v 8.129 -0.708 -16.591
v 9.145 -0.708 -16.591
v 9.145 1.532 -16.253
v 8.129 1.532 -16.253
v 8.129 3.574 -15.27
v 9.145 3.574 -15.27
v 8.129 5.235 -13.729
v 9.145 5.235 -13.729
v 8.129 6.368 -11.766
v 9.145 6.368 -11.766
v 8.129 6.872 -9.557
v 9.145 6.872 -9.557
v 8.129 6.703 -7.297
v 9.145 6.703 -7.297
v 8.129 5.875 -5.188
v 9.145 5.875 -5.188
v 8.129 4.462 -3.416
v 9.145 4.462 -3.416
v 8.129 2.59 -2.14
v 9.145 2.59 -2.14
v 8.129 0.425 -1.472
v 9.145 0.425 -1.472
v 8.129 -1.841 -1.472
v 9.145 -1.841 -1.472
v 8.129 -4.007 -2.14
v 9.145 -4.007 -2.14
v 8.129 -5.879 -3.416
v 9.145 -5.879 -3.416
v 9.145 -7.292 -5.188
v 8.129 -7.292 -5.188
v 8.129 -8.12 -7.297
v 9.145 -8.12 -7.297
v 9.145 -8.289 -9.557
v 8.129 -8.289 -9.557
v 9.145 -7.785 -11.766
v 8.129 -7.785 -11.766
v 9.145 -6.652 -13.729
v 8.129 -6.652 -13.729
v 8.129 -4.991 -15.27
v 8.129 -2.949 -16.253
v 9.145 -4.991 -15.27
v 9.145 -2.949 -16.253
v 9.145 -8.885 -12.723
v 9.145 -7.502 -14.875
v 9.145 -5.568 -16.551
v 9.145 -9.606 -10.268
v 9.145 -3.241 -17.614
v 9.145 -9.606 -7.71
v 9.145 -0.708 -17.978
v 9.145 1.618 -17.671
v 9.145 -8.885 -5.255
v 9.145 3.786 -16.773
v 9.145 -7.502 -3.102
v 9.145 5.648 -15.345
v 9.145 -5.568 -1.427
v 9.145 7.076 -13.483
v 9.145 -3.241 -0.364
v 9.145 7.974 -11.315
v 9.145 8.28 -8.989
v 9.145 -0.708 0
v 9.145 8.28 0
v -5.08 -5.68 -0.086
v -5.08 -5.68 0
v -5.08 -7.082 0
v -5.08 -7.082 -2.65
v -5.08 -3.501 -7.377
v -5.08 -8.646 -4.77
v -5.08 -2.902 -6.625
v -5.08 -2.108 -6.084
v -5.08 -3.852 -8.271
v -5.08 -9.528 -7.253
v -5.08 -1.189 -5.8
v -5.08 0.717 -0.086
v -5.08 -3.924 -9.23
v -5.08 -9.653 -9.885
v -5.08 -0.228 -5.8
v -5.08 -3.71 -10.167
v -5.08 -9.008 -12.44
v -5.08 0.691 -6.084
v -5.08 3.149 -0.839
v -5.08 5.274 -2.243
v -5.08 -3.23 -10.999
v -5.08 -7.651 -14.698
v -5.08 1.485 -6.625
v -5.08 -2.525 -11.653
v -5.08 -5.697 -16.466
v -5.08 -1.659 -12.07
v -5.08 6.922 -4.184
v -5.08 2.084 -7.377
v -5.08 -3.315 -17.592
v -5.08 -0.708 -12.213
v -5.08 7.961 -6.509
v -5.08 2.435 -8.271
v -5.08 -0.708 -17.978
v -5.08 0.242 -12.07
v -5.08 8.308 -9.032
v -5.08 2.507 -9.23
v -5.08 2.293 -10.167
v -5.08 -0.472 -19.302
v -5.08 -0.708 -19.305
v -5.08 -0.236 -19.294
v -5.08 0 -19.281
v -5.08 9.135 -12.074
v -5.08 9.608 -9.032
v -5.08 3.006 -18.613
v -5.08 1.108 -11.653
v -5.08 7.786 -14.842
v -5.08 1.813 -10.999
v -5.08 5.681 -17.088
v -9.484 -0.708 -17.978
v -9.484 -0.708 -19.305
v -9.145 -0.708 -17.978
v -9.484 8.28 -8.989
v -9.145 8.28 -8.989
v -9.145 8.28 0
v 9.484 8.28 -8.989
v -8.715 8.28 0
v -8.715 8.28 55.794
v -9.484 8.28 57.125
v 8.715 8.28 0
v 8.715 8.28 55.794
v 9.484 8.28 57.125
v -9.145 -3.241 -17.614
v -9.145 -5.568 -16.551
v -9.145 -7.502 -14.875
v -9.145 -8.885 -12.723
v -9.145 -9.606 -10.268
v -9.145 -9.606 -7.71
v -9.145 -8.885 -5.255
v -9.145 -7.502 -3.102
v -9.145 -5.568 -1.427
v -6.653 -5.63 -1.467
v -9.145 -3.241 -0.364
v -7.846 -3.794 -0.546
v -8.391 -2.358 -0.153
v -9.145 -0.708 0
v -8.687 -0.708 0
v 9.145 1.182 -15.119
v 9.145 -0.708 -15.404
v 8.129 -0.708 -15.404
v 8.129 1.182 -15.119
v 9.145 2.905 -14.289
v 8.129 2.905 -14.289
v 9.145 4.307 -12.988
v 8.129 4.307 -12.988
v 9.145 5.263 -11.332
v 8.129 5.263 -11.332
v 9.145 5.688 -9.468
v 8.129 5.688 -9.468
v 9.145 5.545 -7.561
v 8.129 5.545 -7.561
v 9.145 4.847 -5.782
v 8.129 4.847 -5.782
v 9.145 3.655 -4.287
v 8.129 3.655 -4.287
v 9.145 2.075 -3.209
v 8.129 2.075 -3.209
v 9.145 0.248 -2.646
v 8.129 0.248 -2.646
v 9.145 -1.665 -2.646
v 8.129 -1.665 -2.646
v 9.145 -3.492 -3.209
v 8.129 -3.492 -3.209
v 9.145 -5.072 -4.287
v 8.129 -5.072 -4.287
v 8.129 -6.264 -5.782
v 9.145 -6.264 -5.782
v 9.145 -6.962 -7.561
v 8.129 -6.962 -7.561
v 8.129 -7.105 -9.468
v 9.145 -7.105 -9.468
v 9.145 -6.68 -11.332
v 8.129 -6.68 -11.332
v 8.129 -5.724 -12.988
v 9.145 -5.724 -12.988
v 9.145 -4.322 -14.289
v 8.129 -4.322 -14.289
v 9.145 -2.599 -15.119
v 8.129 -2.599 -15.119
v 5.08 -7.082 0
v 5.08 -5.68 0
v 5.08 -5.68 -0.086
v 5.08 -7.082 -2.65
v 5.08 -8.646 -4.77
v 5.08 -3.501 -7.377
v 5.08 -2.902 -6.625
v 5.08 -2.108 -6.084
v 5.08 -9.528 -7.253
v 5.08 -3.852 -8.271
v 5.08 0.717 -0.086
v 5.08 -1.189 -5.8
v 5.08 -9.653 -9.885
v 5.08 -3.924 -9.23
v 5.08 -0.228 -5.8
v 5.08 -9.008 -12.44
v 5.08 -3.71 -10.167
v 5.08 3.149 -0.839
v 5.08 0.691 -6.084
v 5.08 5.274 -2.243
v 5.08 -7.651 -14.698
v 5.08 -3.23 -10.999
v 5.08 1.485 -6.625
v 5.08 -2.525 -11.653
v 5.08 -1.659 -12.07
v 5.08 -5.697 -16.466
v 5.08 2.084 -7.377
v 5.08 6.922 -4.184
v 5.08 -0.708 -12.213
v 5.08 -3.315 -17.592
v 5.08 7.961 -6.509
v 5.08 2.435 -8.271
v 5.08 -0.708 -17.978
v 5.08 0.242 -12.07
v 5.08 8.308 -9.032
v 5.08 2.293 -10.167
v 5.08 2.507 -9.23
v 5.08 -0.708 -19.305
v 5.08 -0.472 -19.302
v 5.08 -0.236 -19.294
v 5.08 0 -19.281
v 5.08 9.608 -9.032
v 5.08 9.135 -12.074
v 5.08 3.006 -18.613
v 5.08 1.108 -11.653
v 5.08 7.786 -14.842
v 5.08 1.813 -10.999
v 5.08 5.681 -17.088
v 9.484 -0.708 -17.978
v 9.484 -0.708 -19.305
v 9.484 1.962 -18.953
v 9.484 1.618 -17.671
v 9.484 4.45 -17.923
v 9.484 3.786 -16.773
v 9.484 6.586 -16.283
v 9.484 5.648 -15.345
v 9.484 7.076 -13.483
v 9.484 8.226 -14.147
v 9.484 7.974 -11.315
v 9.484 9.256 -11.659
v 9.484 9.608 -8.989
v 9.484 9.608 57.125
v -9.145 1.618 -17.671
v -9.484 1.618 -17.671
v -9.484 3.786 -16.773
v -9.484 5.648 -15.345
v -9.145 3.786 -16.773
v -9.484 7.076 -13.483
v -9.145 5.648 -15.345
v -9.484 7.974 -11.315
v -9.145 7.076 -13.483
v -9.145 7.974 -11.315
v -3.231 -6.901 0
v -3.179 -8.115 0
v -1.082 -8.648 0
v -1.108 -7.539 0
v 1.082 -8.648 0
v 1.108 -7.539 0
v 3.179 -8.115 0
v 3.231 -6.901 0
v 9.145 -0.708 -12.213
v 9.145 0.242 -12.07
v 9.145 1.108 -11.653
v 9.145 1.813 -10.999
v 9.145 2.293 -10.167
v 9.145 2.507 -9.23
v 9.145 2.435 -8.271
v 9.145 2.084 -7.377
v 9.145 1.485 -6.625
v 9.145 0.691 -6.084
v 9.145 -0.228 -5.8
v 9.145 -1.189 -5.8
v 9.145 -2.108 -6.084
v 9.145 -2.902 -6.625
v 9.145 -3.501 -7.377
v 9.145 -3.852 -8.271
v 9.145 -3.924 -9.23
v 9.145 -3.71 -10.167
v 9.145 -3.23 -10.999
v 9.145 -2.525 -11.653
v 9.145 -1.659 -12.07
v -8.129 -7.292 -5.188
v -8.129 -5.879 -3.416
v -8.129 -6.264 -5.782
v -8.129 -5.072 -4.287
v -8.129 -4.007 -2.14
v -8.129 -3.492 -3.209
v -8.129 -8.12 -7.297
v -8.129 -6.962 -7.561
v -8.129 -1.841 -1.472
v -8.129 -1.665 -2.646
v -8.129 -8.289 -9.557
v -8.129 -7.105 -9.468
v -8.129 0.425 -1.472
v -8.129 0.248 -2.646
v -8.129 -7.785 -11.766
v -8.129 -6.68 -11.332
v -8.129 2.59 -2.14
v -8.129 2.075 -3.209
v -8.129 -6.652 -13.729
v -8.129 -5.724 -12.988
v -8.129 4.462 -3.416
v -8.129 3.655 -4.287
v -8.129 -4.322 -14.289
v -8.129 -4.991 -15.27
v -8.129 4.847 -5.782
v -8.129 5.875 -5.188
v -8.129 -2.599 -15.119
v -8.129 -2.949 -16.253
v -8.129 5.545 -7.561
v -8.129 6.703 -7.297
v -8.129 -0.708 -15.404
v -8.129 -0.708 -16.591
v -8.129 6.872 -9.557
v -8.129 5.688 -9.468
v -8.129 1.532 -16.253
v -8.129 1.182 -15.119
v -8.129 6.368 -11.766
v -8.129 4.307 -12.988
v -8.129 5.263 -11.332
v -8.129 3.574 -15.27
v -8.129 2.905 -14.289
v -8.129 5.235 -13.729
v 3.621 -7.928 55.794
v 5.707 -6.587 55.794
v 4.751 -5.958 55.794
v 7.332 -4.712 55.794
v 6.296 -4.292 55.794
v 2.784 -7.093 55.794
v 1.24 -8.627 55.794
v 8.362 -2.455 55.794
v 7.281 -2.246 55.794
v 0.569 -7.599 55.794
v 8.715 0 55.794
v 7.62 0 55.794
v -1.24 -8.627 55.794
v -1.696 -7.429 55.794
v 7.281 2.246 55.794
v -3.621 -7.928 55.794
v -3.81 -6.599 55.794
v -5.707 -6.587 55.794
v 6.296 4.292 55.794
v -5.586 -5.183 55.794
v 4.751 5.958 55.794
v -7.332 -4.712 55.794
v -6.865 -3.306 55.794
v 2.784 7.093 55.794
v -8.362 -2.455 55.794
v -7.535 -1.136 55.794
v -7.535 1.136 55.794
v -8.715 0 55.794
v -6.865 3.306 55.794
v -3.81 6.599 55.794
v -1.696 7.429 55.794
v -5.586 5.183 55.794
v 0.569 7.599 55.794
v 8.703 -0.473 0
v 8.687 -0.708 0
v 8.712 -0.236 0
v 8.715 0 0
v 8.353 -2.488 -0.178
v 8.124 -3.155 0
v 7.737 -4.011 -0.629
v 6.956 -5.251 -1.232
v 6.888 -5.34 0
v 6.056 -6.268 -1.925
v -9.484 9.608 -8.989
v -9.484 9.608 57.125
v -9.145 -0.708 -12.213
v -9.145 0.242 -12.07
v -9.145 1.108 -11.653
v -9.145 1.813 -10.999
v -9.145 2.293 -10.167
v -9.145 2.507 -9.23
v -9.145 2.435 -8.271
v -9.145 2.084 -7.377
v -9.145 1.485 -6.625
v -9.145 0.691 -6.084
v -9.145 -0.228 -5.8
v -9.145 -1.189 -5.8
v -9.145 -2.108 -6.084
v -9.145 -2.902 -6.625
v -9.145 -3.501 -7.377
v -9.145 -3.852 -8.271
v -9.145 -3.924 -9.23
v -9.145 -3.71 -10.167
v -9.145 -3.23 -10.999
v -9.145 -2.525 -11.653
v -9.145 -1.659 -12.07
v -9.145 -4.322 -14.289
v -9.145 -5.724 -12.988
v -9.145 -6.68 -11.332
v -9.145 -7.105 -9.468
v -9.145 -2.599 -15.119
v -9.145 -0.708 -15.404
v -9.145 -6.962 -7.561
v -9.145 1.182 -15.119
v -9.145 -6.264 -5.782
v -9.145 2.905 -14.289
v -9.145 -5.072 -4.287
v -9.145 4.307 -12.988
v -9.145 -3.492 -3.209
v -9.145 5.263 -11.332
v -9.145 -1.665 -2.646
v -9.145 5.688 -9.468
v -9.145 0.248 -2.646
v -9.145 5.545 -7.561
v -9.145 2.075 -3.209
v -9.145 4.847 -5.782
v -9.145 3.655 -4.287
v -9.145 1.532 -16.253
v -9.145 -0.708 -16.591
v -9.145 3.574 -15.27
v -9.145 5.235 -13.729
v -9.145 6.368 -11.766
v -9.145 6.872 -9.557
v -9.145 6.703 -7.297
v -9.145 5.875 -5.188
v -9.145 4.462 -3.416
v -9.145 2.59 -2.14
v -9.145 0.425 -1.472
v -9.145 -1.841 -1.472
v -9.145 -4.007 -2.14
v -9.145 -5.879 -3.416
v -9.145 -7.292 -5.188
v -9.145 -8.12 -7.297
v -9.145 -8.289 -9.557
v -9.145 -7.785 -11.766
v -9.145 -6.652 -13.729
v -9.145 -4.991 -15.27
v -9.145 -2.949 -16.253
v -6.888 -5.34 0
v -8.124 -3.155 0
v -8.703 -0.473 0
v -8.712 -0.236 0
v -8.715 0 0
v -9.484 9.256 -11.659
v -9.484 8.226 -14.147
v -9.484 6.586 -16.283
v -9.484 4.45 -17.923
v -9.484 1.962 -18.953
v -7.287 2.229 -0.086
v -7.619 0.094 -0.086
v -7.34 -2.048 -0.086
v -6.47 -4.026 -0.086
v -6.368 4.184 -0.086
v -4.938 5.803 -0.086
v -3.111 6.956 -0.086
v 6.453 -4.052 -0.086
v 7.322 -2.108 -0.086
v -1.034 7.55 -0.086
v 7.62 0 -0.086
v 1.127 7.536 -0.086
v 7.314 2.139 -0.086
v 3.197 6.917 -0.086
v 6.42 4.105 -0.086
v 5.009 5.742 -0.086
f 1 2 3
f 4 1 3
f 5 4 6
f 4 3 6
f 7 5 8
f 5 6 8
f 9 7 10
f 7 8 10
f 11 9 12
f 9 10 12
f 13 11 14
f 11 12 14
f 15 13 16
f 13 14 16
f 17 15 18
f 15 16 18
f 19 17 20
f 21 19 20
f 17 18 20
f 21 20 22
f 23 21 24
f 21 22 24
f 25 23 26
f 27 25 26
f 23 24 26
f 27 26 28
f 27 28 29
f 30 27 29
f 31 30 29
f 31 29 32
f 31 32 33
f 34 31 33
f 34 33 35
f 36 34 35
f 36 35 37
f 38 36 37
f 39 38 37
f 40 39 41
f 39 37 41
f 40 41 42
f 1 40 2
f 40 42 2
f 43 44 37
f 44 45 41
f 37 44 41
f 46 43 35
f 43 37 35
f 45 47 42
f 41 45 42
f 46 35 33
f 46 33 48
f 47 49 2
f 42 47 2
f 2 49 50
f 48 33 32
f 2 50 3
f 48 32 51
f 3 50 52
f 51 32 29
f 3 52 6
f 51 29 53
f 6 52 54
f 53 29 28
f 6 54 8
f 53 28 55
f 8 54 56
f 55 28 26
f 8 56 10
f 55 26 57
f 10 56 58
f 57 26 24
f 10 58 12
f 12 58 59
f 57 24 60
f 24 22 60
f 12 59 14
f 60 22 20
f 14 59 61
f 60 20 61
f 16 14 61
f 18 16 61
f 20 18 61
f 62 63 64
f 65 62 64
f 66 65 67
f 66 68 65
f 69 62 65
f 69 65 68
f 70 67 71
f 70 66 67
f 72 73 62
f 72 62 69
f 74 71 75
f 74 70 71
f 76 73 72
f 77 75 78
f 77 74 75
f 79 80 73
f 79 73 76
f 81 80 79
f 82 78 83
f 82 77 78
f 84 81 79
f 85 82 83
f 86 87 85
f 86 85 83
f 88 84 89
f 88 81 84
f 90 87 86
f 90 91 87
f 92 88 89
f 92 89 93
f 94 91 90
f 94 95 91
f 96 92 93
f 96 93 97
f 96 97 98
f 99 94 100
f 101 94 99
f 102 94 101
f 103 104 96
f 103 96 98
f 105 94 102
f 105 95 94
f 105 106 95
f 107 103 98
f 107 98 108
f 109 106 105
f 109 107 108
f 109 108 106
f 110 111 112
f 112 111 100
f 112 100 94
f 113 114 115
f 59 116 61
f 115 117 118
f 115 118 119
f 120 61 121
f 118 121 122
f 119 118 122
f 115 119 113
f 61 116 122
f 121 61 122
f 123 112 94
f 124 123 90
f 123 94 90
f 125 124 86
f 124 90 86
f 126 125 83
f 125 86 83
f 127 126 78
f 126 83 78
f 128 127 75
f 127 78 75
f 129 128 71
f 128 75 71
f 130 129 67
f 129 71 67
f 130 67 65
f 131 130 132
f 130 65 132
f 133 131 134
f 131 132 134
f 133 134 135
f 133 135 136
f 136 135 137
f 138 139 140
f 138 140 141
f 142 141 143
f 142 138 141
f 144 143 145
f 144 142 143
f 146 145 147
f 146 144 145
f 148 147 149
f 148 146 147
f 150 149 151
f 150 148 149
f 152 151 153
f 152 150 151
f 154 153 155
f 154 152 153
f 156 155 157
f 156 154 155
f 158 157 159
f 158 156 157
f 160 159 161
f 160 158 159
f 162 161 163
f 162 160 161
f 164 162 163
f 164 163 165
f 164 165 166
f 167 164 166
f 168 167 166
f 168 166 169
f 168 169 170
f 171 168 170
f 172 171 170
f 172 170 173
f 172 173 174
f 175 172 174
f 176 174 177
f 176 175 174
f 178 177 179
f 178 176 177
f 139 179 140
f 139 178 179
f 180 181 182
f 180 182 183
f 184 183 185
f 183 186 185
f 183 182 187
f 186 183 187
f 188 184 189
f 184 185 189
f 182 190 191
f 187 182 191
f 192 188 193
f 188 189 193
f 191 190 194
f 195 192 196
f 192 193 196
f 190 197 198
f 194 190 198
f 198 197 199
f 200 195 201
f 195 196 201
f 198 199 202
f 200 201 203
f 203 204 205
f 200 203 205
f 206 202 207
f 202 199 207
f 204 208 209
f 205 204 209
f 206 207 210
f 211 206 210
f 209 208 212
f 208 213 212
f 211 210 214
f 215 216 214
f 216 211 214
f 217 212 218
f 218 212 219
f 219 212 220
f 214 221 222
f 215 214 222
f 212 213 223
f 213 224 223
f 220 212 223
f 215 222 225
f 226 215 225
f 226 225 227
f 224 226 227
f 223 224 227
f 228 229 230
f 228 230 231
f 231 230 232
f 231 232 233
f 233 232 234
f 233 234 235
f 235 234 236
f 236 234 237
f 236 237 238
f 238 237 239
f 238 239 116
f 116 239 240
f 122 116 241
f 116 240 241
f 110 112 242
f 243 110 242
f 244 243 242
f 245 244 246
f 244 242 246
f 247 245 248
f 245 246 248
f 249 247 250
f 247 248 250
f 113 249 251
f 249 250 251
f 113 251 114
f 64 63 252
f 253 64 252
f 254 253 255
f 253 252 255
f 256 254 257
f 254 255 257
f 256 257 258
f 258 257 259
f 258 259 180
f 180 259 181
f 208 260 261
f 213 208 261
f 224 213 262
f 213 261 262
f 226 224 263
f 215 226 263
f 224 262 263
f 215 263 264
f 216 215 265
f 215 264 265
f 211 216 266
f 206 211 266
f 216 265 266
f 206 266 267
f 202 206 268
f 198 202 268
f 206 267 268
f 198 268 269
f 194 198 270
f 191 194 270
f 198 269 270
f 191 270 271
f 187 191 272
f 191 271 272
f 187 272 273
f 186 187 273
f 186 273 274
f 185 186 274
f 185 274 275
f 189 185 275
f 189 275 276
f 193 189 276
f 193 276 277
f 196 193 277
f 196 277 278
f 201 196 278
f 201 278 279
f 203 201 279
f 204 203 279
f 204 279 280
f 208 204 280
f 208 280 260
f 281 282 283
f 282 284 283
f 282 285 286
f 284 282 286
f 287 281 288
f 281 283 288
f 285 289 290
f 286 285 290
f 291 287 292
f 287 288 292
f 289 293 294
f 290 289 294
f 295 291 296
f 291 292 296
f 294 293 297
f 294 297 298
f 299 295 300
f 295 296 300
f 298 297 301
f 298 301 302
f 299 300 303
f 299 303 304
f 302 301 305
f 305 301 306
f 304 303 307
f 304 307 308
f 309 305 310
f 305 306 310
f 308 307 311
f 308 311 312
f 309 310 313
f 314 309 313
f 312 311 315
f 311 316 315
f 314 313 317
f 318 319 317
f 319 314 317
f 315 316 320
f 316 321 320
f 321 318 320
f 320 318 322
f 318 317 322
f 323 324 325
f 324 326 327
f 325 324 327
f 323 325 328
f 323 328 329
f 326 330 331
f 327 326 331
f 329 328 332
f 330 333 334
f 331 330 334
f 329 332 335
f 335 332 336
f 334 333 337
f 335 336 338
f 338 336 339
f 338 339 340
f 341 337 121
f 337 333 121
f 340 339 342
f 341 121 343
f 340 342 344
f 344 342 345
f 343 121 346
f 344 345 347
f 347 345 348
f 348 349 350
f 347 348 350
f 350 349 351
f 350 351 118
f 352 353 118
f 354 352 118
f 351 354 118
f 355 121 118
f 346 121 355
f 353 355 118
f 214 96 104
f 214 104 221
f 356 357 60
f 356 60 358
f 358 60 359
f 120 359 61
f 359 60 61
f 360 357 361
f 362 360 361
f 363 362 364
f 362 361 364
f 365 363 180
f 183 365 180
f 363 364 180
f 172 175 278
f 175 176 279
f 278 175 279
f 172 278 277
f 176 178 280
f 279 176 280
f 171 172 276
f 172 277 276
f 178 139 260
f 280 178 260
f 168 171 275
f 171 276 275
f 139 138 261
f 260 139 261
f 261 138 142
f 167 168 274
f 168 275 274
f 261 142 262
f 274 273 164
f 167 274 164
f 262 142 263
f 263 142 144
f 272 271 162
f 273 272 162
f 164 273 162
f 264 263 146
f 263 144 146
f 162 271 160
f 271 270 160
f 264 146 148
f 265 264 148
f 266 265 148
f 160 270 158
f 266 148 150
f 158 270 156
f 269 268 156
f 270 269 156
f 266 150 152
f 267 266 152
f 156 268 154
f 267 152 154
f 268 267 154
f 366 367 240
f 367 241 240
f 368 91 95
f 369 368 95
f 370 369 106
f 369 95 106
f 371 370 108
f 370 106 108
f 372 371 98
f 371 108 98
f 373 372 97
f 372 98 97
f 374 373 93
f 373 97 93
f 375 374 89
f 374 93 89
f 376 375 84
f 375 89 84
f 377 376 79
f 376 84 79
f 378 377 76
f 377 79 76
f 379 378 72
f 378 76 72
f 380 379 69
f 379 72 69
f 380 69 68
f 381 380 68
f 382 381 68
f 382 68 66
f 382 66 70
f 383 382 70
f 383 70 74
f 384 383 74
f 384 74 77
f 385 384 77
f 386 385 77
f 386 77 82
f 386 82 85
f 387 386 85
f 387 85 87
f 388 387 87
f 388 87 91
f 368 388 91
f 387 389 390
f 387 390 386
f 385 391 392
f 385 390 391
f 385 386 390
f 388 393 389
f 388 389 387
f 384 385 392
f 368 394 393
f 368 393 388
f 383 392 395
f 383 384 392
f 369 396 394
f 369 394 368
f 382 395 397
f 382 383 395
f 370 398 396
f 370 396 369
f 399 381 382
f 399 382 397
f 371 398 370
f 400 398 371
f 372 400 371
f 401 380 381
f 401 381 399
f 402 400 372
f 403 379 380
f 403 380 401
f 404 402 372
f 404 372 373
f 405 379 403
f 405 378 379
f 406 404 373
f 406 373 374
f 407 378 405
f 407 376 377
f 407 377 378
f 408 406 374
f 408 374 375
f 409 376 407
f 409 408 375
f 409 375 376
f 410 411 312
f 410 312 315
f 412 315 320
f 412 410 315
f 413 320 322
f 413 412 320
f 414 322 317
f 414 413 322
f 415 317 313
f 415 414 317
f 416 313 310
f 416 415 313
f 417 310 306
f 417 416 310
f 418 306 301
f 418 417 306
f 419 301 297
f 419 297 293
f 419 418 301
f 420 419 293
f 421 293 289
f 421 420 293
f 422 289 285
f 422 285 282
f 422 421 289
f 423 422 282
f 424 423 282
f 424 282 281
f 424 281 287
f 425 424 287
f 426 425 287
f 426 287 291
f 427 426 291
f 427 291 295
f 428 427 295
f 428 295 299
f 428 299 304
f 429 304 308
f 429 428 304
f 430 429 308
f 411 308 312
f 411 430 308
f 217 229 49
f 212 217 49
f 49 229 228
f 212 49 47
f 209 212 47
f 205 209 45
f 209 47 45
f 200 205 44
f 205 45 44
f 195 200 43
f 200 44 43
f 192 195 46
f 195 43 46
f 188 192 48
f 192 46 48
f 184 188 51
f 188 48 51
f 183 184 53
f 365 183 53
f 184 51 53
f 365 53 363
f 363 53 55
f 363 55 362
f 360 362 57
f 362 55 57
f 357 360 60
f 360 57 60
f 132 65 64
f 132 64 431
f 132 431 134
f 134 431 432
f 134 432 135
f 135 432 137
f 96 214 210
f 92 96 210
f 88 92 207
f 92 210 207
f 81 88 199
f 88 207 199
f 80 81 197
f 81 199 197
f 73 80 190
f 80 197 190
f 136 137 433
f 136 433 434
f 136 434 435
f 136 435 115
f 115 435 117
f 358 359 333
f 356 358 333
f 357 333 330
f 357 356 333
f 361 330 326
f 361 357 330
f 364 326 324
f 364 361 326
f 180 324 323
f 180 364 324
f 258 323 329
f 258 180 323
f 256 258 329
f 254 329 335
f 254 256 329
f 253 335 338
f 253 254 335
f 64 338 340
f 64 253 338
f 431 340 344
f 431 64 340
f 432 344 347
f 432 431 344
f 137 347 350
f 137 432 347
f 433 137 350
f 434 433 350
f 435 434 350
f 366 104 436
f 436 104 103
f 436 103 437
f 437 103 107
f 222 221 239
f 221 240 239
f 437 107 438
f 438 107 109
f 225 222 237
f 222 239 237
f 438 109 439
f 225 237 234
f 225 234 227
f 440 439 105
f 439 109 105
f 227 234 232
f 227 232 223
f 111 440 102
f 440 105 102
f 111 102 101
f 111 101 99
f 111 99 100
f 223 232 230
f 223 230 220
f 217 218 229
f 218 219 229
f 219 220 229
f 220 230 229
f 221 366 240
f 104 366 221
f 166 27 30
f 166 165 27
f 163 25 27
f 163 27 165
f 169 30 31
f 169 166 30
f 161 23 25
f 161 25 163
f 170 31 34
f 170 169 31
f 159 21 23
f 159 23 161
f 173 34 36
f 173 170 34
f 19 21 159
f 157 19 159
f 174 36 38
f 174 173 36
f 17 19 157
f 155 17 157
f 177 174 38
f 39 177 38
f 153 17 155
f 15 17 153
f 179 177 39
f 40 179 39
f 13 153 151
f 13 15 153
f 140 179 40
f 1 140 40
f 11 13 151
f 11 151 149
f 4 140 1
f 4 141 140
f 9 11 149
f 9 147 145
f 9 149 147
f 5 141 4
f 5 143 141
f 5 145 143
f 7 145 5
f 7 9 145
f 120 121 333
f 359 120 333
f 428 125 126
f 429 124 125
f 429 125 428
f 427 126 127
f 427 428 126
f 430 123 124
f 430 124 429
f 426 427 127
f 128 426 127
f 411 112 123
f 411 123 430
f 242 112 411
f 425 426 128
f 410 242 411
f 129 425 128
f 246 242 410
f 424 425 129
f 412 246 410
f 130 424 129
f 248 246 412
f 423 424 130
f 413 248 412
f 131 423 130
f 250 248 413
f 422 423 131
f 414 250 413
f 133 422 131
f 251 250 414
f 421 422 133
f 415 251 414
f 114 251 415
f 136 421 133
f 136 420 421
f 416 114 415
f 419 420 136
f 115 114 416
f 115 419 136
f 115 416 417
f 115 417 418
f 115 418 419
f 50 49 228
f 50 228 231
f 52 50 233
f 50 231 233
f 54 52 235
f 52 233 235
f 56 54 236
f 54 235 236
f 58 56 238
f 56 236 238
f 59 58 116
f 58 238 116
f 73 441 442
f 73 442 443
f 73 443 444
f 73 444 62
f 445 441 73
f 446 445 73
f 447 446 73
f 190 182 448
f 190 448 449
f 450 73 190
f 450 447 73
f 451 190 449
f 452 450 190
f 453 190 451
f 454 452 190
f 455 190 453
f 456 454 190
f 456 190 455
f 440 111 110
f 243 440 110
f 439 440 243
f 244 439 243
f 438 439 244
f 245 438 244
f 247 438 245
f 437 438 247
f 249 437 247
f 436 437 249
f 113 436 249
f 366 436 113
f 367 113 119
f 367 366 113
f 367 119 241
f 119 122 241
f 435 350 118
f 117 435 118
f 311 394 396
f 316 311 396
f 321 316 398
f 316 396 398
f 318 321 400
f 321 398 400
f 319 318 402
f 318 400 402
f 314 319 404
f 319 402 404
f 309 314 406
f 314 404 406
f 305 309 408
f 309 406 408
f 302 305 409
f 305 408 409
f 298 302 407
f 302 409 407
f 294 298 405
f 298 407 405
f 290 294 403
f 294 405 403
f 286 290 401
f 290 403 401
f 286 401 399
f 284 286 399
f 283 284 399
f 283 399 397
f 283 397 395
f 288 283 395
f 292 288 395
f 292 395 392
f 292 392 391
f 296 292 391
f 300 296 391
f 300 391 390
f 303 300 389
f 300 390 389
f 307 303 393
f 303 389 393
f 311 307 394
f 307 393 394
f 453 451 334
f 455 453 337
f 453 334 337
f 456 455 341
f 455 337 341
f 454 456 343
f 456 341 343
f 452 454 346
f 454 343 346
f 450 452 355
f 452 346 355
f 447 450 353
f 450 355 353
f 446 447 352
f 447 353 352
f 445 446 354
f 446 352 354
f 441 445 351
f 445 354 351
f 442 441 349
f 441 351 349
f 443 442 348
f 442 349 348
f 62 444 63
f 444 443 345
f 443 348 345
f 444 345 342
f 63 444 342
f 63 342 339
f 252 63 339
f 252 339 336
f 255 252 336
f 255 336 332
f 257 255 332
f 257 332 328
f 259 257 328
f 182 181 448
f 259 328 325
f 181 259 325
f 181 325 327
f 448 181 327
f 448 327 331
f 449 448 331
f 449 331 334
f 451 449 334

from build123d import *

# Parameters (mm, degrees)
EXTRUDE1_DEPTH      = 55.794498856
EXTRUDE6_DEPTH      = 9.14463492
EXTRUDE7_REACH      = 59.365
EXTRUDE_THIN1_DEPTH = 9.483751535
SKETCH9_R           = 7.60188161
SKETCH9_R_2         = 6.414649529
EXTRUDE8_DEPTH      = 1.016
SKETCH10_R          = 3.224544811
EXTRUDE9_DEPTH      = 61.86360078
SKETCH2_R           = 7.62
EXTRUDE11_DEPTH     = 55.88
SKETCH12_R          = 9.016750803
EXTRUDE12_DEPTH     = 5.08
SKETCH13_W          = 10.16
SKETCH13_H          = 19.30498436
EXTRUDE13_DEPTH     = 59.71373486
SKETCH16_W          = 10.16
SKETCH16_H          = 10.249002979
EXTRUDE16_DEPTH     = 59.71373486


with BuildPart() as part:
    # Sketch1 → Extrude1 (new body)
    with BuildSketch(Plane.XY):
        with BuildLine():
            Line((-8.715458206, 8.280410535), (8.715458206, 8.280410535))
            Line((8.715458206, 8.280410535), (8.715458206, 0))
            ThreePointArc((8.715458206, 0), (0, -8.715458206), (-8.715458206, 0))
            Line((-8.715458206, 0), (-8.715458206, 8.280410535))
        make_face()
    extrude(amount=EXTRUDE1_DEPTH)

    # Sketch6 → Extrude6 (add, symmetric)
    with BuildSketch(Plane(origin=(0, 0, 0), x_dir=(0, 0, -1), z_dir=(1, 0, 0))):
        with BuildLine():
            Line((0, 8.280410535), (8.988874968, 8.280410535))
            ThreePointArc((8.988874968, 8.280410535), (15.344969413, -7.064558879), (0, -0.708464433))
            Line((0, -0.708464433), (0, 8.280410535))
        make_face()
    extrude(amount=EXTRUDE6_DEPTH, both=True)

    # Sketch7 → Extrude7 (add, up to next)
    with BuildSketch(Plane(origin=(0, 0, 0), x_dir=(-1, 0, 0), z_dir=(0, 0, -1)), mode=Mode.PRIVATE) as extrude7_sk1:
        with BuildLine():
            Line((8.68661556, -0.708464433), (-8.68661556, -0.708464433))
            ThreePointArc((-8.68661556, -0.708464433), (0, -8.715458206), (8.68661556, -0.708464433))
        make_face()
    extrude7_tool1 = extrude(extrude7_sk1.sketch, amount=EXTRUDE7_REACH, mode=Mode.PRIVATE) - part.part
    add(extrude7_tool1.solids().sort_by_distance((0, -4.084646, 0))[0])

    # Sketch8 → Extrude-Thin1 (add, symmetric)
    with BuildSketch(Plane(origin=(0, 0, 0), x_dir=(0, 0, -1), z_dir=(1, 0, 0))):
        with BuildLine():
            ThreePointArc((17.977749936, -0.708464433), (15.344969413, 5.647630012), (8.988874968, 8.280410535))
            Line((8.988874968, 8.280410535), (0, 8.280410535))
            Line((0, 8.280410535), (-57.125499776, 8.280410535))
            Line((-57.125499776, 8.280410535), (-57.125499776, 9.607644959))
            Line((-57.125499776, 9.607644959), (0, 9.607644959))
            Line((0, 9.607644959), (8.988874968, 9.607644959))
            ThreePointArc((8.988874968, 9.607644959), (16.283465875, 6.586126473), (19.30498436, -0.708464433))
            Line((19.30498436, -0.708464433), (17.977749936, -0.708464433))
        make_face()
    extrude(amount=EXTRUDE_THIN1_DEPTH, both=True)

    # Sketch9 → Extrude8 (cut)
    with BuildSketch(Plane(origin=(9.14463492, 0, 0), x_dir=(0, 0, -1), z_dir=(1, 0, 0))):
        with Locations((8.988874968, -0.708464433)):
            Circle(SKETCH9_R)
        with Locations((8.988874968, -0.708464433)):
            Circle(SKETCH9_R_2, mode=Mode.SUBTRACT)
    extrude8 = extrude(amount=-EXTRUDE8_DEPTH, mode=Mode.SUBTRACT)

    # Sketch10 → Extrude9 (cut, through all)
    with BuildSketch(Plane(origin=(9.14463492, 0, 0), x_dir=(0, 0, -1), z_dir=(1, 0, 0))):
        with Locations((8.988874968, -0.708464433)):
            Circle(SKETCH10_R)
    extrude(amount=-EXTRUDE9_DEPTH, mode=Mode.SUBTRACT)

    # Mirror1: Extrude8 across plane
    add(extrude8.mirror(Plane(origin=(0, 0, 0), x_dir=(0, 0, 1), z_dir=(1, 0, 0))), mode=Mode.SUBTRACT)

    # Sketch2 → Extrude11 (cut)
    with BuildSketch(Plane.XY.offset(55.794498856)):
        Circle(SKETCH2_R)
    extrude(amount=-EXTRUDE11_DEPTH, mode=Mode.SUBTRACT)

    # Sketch12 → Extrude12 (cut, symmetric)
    with BuildSketch(Plane(origin=(0, 0, 0), x_dir=(0, 0, -1), z_dir=(1, 0, 0))):
        with Locations((8.988874968, -0.708464433)):
            Circle(SKETCH12_R)
    extrude(amount=EXTRUDE12_DEPTH, both=True, mode=Mode.SUBTRACT)

    # Sketch13 → Extrude13 (cut, through all)
    with BuildSketch(Plane(origin=(0, 0, 0), x_dir=(1, 0, 0), z_dir=(0, 1, 0))):
        with Locations((0, 9.65249218)):
            Rectangle(SKETCH13_W, SKETCH13_H)
    extrude(amount=-EXTRUDE13_DEPTH, mode=Mode.SUBTRACT)

    # Sketch16 → Extrude16 (cut, through all)
    with BuildSketch(Plane(origin=(0, 0, 0), x_dir=(1, 0, 0), z_dir=(0, 1, 0))):
        with Locations((0, 14.15612703)):
            Rectangle(SKETCH16_W, SKETCH16_H)
    extrude(amount=EXTRUDE16_DEPTH, mode=Mode.SUBTRACT)


solid = part.part
